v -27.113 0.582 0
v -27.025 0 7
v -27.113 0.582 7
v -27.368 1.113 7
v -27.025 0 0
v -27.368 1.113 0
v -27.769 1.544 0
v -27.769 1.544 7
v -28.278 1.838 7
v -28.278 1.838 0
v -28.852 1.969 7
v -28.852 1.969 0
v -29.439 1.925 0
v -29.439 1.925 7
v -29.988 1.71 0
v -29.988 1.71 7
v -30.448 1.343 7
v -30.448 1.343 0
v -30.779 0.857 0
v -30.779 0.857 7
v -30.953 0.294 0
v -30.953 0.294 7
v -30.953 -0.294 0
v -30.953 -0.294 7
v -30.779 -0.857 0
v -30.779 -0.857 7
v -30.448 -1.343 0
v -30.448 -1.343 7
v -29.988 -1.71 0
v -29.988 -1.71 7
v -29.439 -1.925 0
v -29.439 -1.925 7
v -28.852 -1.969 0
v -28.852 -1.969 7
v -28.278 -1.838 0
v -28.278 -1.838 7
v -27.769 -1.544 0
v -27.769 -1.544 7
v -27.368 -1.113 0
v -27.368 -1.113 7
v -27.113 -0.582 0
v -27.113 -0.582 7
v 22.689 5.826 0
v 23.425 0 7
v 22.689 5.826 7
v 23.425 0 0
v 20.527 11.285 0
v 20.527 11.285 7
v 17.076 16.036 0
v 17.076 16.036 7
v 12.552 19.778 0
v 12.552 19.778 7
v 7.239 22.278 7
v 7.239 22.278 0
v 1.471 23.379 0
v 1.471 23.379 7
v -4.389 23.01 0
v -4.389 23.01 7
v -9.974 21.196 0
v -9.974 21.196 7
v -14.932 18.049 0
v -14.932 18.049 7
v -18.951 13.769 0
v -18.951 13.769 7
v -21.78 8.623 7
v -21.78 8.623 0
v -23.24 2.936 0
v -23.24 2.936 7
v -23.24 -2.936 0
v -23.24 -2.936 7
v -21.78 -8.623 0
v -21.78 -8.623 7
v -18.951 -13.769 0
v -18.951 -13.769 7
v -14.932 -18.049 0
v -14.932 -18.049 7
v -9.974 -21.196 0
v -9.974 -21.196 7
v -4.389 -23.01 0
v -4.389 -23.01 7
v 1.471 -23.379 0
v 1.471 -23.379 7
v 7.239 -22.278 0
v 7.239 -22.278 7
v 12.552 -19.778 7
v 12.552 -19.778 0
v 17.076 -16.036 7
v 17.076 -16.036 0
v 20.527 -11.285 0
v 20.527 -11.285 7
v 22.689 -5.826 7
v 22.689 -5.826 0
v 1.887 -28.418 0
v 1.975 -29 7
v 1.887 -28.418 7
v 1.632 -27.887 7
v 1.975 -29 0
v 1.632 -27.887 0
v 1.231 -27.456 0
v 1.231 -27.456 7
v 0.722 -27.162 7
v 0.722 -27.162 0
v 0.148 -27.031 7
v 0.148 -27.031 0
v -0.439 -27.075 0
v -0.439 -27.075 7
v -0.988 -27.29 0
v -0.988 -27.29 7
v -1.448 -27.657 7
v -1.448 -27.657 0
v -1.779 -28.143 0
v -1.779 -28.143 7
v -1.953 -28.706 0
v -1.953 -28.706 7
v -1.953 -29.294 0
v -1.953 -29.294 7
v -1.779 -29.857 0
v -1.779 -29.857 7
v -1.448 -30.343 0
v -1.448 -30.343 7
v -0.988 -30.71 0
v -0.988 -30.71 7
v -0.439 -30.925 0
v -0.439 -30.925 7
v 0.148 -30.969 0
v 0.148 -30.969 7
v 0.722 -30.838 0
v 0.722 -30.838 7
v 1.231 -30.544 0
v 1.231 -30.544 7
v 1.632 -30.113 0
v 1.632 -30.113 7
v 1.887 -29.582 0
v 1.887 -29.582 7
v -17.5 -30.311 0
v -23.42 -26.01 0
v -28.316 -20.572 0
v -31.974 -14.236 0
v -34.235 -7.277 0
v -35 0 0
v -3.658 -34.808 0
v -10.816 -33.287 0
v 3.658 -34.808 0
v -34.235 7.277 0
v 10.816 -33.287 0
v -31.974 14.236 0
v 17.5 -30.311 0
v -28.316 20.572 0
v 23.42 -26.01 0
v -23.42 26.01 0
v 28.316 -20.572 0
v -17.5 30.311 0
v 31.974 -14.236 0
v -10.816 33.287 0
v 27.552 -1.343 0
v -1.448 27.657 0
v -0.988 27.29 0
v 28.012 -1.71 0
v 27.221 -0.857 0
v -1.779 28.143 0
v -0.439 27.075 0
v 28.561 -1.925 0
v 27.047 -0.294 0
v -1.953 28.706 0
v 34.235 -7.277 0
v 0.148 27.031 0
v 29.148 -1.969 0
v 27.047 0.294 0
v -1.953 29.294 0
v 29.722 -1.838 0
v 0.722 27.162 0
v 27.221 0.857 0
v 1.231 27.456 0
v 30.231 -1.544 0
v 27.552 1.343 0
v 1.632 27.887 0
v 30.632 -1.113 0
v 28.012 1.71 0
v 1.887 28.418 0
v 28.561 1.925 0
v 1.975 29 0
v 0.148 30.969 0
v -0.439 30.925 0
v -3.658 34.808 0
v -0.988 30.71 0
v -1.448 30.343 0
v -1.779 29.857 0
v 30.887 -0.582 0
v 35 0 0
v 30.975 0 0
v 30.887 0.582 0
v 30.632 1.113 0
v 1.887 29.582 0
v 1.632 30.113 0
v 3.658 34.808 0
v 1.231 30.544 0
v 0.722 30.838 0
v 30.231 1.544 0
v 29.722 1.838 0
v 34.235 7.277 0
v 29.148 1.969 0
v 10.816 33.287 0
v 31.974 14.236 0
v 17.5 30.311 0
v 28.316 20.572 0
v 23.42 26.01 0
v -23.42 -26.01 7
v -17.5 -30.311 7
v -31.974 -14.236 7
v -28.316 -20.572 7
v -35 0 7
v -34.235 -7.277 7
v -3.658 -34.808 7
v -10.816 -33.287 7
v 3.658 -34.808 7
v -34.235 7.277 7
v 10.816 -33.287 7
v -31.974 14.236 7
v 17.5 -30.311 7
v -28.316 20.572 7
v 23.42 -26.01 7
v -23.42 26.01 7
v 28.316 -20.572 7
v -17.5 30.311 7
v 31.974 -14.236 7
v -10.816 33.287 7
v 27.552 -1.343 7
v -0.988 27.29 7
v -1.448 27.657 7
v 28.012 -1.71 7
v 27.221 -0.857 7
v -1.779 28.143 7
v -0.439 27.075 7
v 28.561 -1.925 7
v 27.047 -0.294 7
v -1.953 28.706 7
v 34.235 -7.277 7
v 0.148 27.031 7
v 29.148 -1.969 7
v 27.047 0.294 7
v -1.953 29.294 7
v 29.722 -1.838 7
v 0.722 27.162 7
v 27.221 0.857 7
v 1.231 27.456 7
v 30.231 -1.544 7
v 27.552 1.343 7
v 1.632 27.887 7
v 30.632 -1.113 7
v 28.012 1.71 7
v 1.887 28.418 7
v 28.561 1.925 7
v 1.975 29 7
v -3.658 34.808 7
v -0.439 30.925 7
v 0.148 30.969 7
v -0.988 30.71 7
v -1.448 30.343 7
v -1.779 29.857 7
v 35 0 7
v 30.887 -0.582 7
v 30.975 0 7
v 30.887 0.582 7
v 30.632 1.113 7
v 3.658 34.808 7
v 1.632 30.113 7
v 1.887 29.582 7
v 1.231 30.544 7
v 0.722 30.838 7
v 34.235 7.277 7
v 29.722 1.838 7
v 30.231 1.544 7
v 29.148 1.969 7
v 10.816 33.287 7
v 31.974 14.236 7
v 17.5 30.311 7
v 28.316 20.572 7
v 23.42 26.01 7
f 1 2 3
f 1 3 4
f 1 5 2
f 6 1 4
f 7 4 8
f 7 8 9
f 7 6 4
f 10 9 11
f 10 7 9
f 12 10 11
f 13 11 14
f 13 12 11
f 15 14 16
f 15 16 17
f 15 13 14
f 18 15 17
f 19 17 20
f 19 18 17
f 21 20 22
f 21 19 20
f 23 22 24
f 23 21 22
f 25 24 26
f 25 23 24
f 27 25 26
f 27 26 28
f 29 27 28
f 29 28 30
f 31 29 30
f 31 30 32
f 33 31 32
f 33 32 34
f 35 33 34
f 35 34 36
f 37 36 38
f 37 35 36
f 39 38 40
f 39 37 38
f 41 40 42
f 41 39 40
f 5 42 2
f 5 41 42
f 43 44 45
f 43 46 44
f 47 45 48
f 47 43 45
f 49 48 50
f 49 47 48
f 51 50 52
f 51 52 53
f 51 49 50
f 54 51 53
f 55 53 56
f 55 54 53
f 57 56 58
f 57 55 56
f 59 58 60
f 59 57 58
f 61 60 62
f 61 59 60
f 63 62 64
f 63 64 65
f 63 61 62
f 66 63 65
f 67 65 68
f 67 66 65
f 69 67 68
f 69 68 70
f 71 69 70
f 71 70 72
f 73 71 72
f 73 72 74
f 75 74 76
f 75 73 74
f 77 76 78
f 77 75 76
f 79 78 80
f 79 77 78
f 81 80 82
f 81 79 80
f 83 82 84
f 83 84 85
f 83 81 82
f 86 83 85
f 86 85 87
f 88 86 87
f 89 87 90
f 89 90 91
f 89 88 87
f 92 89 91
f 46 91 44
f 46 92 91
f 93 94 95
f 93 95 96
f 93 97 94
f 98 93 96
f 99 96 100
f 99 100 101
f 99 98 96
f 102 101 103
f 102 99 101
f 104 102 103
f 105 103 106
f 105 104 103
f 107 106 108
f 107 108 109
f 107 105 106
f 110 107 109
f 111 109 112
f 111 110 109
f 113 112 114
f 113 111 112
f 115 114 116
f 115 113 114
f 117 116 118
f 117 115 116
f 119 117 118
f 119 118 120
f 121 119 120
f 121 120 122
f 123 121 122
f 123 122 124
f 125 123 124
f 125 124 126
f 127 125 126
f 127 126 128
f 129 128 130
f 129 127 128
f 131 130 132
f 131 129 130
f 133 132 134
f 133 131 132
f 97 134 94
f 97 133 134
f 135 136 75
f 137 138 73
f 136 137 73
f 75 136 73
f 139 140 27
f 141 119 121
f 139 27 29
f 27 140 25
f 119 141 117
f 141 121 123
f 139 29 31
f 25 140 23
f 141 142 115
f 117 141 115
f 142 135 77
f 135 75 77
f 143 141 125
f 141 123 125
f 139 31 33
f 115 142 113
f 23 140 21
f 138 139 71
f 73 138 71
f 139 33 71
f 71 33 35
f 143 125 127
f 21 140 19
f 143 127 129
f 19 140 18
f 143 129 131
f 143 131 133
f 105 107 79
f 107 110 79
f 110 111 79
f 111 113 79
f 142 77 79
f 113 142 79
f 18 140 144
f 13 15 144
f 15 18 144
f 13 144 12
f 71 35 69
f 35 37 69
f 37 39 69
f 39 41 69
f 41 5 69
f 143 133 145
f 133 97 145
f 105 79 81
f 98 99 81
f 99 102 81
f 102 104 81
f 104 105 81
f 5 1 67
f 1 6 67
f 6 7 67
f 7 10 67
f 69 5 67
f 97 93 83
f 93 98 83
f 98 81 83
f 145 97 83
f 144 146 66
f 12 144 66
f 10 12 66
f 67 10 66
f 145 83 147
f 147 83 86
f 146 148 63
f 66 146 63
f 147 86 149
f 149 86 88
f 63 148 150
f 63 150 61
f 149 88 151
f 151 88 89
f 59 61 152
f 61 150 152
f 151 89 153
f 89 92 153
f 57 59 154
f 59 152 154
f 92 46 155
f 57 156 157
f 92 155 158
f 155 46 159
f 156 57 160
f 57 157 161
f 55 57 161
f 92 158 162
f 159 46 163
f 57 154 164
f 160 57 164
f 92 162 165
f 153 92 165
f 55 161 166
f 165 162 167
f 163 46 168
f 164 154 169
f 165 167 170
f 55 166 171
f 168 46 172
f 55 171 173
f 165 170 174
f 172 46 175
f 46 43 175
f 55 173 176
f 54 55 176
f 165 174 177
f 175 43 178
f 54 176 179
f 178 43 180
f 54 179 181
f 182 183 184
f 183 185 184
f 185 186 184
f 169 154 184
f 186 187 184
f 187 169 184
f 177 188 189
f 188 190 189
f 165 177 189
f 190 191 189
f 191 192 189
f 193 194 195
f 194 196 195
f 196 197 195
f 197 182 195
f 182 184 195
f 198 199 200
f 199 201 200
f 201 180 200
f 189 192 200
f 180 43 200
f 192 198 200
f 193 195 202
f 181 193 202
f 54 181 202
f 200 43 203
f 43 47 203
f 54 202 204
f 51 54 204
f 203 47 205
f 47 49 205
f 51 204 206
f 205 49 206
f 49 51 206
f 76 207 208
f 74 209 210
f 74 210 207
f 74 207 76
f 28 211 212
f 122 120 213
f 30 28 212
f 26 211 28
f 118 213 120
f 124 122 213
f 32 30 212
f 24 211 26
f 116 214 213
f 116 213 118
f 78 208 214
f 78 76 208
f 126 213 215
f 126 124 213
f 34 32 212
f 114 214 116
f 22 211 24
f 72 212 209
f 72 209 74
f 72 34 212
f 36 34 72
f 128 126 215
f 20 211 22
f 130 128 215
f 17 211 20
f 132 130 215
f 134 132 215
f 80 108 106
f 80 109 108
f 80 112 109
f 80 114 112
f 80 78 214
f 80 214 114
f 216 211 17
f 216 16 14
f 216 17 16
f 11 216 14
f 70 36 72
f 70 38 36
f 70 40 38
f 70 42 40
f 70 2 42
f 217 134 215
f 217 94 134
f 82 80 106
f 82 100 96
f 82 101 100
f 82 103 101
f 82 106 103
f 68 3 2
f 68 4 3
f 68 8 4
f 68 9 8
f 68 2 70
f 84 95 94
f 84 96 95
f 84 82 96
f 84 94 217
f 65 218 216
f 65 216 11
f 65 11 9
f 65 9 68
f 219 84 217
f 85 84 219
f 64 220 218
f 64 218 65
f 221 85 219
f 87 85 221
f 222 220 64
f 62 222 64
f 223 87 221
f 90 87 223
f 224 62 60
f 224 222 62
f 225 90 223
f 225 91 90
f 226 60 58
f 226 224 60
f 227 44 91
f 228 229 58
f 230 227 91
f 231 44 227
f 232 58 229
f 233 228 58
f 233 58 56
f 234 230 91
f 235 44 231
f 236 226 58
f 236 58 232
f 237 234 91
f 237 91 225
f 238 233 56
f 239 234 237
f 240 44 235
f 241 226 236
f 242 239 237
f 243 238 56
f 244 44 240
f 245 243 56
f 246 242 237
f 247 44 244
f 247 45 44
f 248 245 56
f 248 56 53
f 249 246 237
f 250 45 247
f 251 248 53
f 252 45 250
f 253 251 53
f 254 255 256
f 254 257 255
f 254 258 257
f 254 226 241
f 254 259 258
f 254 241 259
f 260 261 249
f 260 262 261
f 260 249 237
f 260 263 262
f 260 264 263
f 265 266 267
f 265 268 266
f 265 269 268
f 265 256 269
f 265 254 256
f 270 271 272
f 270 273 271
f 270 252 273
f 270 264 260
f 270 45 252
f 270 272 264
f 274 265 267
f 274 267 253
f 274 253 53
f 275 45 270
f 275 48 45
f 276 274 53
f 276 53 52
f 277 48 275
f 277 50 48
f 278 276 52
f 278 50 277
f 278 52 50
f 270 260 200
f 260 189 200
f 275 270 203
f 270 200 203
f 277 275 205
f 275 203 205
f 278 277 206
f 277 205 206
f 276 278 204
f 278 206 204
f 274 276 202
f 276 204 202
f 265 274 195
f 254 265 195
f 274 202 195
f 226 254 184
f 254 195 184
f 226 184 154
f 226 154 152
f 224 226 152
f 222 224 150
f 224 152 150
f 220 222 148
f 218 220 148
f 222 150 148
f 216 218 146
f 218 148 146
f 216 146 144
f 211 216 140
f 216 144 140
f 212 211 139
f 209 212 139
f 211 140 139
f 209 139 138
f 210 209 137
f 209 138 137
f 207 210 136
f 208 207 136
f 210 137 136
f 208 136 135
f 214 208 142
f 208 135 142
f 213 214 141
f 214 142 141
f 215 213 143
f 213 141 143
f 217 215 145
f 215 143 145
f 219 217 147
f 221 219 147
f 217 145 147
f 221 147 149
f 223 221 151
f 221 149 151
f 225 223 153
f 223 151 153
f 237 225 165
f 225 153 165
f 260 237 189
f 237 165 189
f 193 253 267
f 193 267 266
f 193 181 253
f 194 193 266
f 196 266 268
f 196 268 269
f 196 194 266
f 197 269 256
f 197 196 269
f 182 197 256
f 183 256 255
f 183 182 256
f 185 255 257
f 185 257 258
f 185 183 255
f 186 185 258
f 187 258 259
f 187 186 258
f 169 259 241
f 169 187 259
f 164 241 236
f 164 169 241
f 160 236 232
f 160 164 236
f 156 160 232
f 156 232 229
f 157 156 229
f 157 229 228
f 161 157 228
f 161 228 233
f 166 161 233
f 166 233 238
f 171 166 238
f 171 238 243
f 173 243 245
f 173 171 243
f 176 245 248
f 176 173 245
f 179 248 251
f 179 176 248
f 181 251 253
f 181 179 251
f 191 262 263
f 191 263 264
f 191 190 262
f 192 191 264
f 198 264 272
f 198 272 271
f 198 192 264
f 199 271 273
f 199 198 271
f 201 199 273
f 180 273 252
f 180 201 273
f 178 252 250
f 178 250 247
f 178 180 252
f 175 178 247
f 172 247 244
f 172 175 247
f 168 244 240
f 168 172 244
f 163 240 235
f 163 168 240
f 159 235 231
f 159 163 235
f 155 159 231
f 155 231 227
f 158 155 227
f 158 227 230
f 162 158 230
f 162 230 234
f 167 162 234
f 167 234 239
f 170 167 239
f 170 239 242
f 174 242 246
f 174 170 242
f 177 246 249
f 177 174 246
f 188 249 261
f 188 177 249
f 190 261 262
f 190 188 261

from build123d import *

# Parameters (mm, degrees)
SKETCH1_R           = 35
SKETCH1_R_2         = 23.425
SKETCH1_R_3         = 1.975
BOSS_EXTRUDE1_DEPTH = 5
SKETCH4_R           = 35
SKETCH4_R_2         = 23.425
SKETCH4_R_3         = 1.975
BOSS_EXTRUDE3_DEPTH = 2


with BuildPart() as part:
    # Sketch1 → Boss-Extrude1 (new body)
    with BuildSketch(Plane.XY):
        Circle(SKETCH1_R)
        Circle(SKETCH1_R_2, mode=Mode.SUBTRACT)
        with Locations((0, 29)):
            Circle(SKETCH1_R_3, mode=Mode.SUBTRACT)
        with Locations((29, 0)):
            Circle(SKETCH1_R_3, mode=Mode.SUBTRACT)
        with Locations((0, -29)):
            Circle(SKETCH1_R_3, mode=Mode.SUBTRACT)
        with Locations((-29, 0)):
            Circle(SKETCH1_R_3, mode=Mode.SUBTRACT)
    extrude(amount=BOSS_EXTRUDE1_DEPTH)

    # Sketch4 → Boss-Extrude3 (add)
    with BuildSketch(Plane.XY.offset(5)):
        Circle(SKETCH4_R)
        Circle(SKETCH4_R_2, mode=Mode.SUBTRACT)
        with Locations((0, 29)):
            Circle(SKETCH4_R_3, mode=Mode.SUBTRACT)
        with Locations((29, 0)):
            Circle(SKETCH4_R_3, mode=Mode.SUBTRACT)
        with Locations((0, -29)):
            Circle(SKETCH4_R_3, mode=Mode.SUBTRACT)
        with Locations((-29, 0)):
            Circle(SKETCH4_R_3, mode=Mode.SUBTRACT)
    extrude(amount=BOSS_EXTRUDE3_DEPTH)


solid = part.part
